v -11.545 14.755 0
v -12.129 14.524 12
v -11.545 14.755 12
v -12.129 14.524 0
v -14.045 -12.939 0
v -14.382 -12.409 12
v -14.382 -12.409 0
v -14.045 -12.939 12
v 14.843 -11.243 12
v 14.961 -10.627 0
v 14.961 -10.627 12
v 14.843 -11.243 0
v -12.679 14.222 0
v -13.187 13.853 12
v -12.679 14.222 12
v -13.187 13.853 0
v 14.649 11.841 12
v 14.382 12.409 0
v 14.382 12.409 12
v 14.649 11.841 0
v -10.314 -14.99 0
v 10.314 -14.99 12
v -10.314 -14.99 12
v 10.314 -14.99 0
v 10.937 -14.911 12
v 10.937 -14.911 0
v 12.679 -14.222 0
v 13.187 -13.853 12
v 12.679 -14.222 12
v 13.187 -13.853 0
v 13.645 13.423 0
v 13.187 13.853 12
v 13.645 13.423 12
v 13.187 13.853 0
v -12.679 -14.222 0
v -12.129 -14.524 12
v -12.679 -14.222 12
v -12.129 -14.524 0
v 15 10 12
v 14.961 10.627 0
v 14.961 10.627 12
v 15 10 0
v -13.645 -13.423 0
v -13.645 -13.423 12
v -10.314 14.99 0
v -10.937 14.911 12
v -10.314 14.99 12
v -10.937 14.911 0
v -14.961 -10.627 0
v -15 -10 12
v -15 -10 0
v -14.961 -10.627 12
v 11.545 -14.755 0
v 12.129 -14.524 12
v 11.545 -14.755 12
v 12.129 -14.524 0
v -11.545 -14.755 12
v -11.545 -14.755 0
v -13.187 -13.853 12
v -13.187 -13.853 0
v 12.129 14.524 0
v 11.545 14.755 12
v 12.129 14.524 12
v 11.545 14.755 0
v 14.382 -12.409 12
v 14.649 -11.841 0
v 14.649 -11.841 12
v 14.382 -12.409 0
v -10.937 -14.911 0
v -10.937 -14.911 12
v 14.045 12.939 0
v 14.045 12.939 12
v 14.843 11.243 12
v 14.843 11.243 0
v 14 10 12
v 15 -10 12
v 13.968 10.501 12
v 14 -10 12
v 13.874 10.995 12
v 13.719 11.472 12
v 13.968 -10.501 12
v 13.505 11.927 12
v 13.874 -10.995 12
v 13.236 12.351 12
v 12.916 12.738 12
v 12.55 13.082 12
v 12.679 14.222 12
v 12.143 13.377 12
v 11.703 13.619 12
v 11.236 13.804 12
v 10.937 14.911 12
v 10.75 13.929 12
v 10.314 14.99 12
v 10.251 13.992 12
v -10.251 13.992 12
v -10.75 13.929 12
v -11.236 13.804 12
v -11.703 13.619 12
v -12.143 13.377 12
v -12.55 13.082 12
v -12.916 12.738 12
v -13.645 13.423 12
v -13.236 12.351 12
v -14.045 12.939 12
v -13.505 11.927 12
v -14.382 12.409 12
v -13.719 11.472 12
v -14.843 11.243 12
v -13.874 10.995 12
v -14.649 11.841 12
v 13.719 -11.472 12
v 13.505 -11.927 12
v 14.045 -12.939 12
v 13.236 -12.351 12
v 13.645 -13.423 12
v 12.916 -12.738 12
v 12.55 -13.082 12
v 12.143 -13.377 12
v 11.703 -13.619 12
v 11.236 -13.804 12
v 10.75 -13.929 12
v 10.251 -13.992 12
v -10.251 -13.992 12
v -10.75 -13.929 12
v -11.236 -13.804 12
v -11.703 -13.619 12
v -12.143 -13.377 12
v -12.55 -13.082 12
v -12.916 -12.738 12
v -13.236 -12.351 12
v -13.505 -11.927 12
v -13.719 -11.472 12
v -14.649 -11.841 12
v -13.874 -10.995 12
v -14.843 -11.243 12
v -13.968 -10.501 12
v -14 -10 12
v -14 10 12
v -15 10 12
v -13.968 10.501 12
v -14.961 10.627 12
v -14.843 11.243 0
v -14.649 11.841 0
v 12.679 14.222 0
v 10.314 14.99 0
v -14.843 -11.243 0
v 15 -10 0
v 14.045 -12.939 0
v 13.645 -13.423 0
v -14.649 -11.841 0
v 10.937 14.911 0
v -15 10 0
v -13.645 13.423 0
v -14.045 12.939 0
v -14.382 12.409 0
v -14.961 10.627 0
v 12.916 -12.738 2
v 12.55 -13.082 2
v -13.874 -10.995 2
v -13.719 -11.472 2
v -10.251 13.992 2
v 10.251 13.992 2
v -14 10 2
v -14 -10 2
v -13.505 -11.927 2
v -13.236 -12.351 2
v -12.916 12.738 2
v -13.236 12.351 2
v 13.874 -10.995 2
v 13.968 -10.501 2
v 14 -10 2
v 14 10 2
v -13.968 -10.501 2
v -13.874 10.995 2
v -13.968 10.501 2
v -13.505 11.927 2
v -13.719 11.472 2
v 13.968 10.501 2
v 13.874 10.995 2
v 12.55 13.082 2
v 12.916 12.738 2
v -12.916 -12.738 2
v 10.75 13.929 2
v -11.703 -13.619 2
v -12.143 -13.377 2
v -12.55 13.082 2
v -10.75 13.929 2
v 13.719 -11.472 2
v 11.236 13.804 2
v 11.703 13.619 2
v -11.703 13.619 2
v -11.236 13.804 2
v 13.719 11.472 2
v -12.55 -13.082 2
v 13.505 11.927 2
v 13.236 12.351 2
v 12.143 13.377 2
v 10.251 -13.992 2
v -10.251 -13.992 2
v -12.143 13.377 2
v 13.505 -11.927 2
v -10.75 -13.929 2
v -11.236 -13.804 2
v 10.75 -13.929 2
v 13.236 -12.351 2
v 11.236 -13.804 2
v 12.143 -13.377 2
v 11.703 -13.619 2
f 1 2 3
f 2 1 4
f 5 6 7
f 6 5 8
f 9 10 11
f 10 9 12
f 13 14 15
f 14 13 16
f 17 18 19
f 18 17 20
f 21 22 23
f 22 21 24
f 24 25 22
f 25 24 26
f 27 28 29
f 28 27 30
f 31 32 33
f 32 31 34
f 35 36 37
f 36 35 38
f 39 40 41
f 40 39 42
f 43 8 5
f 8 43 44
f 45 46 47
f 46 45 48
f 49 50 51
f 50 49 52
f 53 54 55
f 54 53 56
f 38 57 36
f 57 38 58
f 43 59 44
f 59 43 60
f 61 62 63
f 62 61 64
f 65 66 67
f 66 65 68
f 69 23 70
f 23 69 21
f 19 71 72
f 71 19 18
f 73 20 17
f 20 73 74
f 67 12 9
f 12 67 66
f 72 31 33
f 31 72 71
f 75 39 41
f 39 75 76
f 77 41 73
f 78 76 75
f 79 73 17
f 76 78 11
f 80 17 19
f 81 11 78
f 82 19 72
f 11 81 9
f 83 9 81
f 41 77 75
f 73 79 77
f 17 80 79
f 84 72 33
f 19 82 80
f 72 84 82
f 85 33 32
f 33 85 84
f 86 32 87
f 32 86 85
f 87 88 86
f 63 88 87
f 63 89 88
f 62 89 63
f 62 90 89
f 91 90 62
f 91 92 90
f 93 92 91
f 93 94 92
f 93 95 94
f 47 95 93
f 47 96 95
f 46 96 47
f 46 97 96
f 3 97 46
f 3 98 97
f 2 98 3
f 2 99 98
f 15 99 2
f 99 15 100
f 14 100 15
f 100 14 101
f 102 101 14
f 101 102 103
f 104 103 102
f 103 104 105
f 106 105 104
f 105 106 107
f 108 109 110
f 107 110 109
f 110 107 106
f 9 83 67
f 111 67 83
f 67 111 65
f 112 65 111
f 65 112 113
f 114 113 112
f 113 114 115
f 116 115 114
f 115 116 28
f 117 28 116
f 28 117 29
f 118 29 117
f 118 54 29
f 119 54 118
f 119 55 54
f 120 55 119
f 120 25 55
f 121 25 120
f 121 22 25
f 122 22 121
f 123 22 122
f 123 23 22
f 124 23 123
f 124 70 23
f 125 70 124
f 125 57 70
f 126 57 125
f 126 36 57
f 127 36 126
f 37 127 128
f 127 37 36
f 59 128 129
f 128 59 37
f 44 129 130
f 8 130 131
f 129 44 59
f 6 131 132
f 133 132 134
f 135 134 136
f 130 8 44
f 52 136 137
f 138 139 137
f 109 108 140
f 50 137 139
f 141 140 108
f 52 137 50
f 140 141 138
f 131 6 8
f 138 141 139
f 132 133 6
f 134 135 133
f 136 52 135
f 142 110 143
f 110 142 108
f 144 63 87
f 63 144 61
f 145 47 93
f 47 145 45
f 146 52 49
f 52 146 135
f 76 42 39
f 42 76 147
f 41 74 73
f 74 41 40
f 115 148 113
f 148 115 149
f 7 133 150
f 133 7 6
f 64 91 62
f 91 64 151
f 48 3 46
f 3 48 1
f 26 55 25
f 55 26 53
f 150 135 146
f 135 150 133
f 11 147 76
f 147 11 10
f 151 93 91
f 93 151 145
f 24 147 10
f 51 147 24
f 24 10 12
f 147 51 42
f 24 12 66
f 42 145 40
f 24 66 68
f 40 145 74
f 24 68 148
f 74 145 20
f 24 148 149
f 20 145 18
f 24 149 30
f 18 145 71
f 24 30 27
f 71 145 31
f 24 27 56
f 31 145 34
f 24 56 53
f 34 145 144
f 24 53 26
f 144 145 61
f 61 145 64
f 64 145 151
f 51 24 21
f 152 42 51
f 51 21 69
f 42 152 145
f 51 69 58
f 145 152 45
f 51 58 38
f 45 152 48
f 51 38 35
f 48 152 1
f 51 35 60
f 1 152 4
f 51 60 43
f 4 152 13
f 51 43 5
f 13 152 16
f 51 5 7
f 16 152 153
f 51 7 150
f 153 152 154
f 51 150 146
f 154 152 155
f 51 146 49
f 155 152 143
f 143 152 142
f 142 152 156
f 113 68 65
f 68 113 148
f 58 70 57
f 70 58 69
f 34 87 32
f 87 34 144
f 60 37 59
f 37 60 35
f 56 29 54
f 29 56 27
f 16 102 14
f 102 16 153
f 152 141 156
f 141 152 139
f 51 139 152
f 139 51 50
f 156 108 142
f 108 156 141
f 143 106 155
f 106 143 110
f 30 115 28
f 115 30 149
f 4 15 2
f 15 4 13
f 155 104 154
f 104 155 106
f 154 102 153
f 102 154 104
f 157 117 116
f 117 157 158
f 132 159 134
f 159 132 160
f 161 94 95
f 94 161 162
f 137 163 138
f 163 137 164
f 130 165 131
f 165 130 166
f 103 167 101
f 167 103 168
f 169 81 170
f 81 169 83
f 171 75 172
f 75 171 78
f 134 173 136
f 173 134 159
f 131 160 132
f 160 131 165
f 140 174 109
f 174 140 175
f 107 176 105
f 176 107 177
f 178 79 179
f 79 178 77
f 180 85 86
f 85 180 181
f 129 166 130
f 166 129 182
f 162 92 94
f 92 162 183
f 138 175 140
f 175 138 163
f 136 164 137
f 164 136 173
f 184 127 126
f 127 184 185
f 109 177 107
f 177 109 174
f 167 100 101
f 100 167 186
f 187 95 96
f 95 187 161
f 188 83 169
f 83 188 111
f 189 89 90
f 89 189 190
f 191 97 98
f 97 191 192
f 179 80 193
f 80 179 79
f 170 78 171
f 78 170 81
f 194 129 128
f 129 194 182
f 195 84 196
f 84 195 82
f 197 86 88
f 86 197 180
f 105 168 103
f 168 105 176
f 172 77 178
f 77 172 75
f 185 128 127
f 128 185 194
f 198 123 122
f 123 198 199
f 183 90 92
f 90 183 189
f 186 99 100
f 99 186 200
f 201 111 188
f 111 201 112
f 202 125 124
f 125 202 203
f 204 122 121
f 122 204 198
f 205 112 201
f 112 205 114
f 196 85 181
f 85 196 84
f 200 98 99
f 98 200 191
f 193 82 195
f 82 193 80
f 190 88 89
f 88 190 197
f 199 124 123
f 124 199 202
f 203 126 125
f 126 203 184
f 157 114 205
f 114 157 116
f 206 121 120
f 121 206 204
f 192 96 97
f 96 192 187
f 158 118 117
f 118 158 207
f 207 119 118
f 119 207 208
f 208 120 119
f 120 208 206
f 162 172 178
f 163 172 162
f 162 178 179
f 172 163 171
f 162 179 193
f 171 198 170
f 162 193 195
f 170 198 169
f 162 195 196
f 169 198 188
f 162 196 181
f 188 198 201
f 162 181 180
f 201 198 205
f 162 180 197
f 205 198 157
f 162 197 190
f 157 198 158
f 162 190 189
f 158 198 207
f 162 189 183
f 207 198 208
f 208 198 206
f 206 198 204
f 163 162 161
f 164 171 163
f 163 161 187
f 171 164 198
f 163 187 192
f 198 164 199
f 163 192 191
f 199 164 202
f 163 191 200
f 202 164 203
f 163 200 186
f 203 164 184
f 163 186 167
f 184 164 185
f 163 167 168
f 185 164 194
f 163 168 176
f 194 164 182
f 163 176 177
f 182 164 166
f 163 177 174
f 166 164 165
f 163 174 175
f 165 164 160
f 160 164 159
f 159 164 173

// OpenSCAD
$fn = 50;


difference() {
	union() {
		hull() {
			translate(v = [-10.0000000000, 10.0000000000, 0]) {
				cylinder(h = 12, r = 5);
			}
			translate(v = [10.0000000000, 10.0000000000, 0]) {
				cylinder(h = 12, r = 5);
			}
			translate(v = [-10.0000000000, -10.0000000000, 0]) {
				cylinder(h = 12, r = 5);
			}
			translate(v = [10.0000000000, -10.0000000000, 0]) {
				cylinder(h = 12, r = 5);
			}
		}
	}
	union() {
		translate(v = [0, 0, 2]) {
			hull() {
				translate(v = [-10.0000000000, 10.0000000000, 0]) {
					cylinder(h = 10, r = 4);
				}
				translate(v = [10.0000000000, 10.0000000000, 0]) {
					cylinder(h = 10, r = 4);
				}
				translate(v = [-10.0000000000, -10.0000000000, 0]) {
					cylinder(h = 10, r = 4);
				}
				translate(v = [10.0000000000, -10.0000000000, 0]) {
					cylinder(h = 10, r = 4);
				}
			}
		}
	}
}
